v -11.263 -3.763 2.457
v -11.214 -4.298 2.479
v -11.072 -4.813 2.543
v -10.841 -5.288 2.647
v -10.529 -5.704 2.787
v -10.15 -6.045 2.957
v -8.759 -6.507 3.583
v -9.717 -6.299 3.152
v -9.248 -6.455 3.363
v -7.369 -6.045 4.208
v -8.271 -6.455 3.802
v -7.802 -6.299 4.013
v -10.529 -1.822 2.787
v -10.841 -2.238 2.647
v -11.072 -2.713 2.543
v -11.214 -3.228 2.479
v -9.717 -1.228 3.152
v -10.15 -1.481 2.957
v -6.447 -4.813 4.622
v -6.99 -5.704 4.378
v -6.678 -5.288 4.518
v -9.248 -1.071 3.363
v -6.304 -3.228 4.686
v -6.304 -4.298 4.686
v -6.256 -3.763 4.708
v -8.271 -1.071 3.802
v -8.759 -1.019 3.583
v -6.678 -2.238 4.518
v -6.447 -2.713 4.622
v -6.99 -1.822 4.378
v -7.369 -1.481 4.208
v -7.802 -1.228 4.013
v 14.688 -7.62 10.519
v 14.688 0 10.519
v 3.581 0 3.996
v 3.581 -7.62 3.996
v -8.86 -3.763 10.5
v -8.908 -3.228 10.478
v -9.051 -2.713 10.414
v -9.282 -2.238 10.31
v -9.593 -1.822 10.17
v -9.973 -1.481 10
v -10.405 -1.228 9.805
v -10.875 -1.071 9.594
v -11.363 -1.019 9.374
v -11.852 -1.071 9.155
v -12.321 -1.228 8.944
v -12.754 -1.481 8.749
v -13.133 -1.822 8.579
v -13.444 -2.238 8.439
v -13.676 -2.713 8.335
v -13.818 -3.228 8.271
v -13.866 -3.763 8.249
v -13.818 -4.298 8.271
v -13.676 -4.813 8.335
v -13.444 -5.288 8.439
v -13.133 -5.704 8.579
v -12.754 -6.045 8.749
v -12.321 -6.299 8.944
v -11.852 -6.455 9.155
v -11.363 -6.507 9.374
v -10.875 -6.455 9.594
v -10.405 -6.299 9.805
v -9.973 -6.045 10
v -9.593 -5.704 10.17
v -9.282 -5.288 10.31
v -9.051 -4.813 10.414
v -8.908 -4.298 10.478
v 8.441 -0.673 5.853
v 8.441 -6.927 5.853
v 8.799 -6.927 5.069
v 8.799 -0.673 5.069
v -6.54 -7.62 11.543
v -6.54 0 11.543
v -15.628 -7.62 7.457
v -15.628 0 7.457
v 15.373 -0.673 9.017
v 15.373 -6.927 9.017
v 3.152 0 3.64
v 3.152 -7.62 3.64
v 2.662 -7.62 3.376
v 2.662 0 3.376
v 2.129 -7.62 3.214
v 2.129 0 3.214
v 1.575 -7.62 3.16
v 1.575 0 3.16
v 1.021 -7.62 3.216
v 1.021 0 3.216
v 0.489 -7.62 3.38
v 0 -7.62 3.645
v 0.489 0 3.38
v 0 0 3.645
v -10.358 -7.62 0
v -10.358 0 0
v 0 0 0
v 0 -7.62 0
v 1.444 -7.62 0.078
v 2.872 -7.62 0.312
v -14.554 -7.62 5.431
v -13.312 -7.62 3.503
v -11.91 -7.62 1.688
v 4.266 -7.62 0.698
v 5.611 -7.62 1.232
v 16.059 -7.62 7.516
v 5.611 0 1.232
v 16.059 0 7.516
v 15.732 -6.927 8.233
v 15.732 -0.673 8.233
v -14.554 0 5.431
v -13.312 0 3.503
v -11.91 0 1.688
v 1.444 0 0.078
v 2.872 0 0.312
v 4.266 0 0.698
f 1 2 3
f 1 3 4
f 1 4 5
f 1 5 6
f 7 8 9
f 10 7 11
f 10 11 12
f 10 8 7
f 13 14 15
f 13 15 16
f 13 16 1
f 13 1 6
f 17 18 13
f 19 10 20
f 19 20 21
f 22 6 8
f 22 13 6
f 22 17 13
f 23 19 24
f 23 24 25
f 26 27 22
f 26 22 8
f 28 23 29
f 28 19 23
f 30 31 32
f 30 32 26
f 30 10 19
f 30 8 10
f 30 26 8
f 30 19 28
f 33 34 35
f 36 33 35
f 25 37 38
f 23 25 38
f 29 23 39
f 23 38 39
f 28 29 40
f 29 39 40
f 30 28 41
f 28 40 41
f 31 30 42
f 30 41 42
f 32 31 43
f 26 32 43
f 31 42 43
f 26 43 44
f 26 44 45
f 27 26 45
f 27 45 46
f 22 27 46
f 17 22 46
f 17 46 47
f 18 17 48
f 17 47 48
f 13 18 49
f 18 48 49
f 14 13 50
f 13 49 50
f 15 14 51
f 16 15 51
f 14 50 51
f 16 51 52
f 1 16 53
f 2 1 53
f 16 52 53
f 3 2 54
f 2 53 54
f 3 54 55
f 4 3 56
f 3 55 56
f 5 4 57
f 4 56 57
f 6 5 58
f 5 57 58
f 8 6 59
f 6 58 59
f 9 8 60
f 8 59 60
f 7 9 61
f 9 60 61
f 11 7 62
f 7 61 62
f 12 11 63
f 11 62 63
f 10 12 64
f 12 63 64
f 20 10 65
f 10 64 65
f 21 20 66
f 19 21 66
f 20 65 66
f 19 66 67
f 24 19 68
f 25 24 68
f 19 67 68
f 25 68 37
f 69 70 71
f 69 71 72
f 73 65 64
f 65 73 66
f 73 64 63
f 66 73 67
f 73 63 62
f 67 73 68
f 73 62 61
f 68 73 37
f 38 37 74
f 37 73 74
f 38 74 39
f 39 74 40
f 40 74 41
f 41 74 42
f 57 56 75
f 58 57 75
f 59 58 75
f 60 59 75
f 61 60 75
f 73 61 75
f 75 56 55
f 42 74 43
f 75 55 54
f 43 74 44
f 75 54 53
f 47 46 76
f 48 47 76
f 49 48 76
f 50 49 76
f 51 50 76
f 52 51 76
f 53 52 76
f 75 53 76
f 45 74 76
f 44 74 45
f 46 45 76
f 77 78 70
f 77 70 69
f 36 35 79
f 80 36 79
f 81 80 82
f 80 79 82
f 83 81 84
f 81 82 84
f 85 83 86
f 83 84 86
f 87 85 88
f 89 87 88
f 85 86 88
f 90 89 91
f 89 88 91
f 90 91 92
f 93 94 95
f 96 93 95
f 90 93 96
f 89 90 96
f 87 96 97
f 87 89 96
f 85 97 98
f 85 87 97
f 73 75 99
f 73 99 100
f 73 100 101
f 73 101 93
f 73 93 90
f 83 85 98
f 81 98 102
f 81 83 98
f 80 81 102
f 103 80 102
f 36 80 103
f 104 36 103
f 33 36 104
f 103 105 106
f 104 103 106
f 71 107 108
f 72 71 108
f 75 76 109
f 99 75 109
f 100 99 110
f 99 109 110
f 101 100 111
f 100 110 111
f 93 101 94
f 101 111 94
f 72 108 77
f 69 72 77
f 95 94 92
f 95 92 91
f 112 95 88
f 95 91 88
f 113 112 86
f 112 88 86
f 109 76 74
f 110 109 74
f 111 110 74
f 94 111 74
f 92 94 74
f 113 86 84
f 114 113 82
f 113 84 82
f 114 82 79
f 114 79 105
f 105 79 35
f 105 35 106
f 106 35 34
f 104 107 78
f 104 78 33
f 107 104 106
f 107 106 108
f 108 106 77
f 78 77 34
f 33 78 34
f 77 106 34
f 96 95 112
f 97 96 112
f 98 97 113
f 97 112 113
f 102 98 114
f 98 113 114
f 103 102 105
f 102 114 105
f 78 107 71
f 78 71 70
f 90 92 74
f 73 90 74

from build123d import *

# Parameters (mm, degrees)
F1_DEPTH = 7.62
F2_DEPTH = 7.62
F3_R     = 2.7444013429
F4_DEPTH = 6.35
F5_W     = 6.2532699667
F5_H     = 0.86275296
F6_DEPTH = 7.62


with BuildPart() as f1:
    # F0 (on Front) → F1 (new body)
    with BuildSketch(Plane.XZ):
        with BuildLine():
            Line((-10.3579089046, 0), (0, 0))
            Line((0, 0), (0, 3.645401448))
            Line((0, 3.645401448), (-6.5403589979, 11.5425735712))
            Line((-6.5403589979, 11.5425735712), (-15.6276854686, 7.4571091682))
            ThreePointArc((-15.6276854686, 7.4571091682), (-13.3121430449, 3.5028798243), (-10.3579089046, 0))
        make_face()
    extrude(amount=F1_DEPTH)

    # F0 (on Front) → F2 (join)
    with BuildSketch(Plane.XZ):
        with BuildLine():
            Line((0, 3.645401448), (0, 0))
            ThreePointArc((0, 0), (2.8721308182, 0.311594991), (5.6106159464, 1.2318808585))
            Line((5.6106159464, 1.2318808585), (16.058837386, 7.5155025299))
            Line((16.058837386, 7.5155025299), (14.6878519678, 10.5192856507))
            Line((14.6878519678, 10.5192856507), (3.5806233063, 3.9957128465))
            ThreePointArc((3.5806233063, 3.9957128465), (1.853653217, 3.1731266591), (0, 3.645401448))
        make_face()
    extrude(amount=F2_DEPTH)

    # F3 (on face) → F4 (cut)
    with BuildSketch(Plane(origin=(-5.4164543998, 0, 12.0478566424), x_dir=(0.9120653953, 0, 0.4100447715), z_dir=(-0.4100447715, 0, 0.9120653953))):
        with Locations((-6.5201530233, -3.7630312145)):
            Circle(F3_R)
    extrude(amount=-F4_DEPTH, mode=Mode.SUBTRACT)

    # F5 (on face) → F6 (cut)
    with BuildSketch(Plane(origin=(16.1290707313, 0, 7.3616236234), x_dir=(0, 1, 0), z_dir=(0.9097231122, 0, 0.4152154371))):
        with Locations((-3.7998675834, 1.3887053062)):
            Rectangle(F5_W, F5_H)
    extrude(amount=-F6_DEPTH, mode=Mode.SUBTRACT)


solid = f1.part
